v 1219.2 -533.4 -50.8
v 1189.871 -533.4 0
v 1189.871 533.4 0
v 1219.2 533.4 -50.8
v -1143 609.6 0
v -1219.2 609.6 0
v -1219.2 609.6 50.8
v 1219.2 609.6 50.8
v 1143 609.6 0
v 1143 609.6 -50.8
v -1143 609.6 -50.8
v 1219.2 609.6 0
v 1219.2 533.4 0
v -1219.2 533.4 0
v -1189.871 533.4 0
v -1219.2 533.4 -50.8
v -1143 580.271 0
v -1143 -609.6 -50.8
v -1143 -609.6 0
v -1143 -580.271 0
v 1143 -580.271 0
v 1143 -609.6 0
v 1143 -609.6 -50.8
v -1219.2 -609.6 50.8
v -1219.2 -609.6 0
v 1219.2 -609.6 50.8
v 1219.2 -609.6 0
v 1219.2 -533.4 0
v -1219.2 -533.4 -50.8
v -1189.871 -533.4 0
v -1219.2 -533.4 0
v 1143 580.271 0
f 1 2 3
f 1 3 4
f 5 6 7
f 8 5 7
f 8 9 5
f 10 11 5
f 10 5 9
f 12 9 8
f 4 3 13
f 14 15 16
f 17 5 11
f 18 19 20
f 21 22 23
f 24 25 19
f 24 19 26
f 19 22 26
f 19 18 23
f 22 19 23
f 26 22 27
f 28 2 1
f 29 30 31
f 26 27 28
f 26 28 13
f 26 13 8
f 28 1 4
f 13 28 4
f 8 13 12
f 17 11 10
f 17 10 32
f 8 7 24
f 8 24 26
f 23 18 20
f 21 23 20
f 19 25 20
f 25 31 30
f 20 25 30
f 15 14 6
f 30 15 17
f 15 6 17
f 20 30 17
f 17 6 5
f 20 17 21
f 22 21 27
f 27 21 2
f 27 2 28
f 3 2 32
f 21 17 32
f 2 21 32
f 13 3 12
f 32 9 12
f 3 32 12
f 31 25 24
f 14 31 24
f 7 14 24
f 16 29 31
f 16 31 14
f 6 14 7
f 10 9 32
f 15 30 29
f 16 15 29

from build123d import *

# Parameters (mm, degrees)
F0_W     = 2438.4
F0_H     = 1219.2
F1_DEPTH = 50.8
F3_DEPTH = 1143
F6_DEPTH = 533.4


# Not quite as in the source:
# - a pattern or mirror of a feature is missing from the dataset's text; its kind, count and spacing are read off the source's solid


with BuildPart() as f1:
    # F0 (on Top) → F1 (new body)
    with BuildSketch(Plane.XY):
        Rectangle(F0_W, F0_H)
    extrude(amount=F1_DEPTH)

    # F2 (on Right) → F3 (join, symmetric)
    with BuildSketch(Plane.YZ):
        Polygon((-609.6, -50.8), (-580.2706063252, 0), (-609.6, 0), align=None)
    f3 = extrude(amount=F3_DEPTH, both=True)

    # F3_copies: F3 across plane
    add(f3.mirror(Plane.ZX))

    # F5 (on Front) → F6 (join, symmetric)
    with BuildSketch(Plane.XZ):
        Polygon((1219.2, 0), (1189.8706063252, 0), (1219.2, -50.8), align=None)
    f6 = extrude(amount=F6_DEPTH, both=True)

    # F6_copies: F6 across plane
    add(f6.mirror(Plane(origin=(0, 0, 0), x_dir=(0, 0, -1), z_dir=(-1, 0, 0))))


solid = f1.part
